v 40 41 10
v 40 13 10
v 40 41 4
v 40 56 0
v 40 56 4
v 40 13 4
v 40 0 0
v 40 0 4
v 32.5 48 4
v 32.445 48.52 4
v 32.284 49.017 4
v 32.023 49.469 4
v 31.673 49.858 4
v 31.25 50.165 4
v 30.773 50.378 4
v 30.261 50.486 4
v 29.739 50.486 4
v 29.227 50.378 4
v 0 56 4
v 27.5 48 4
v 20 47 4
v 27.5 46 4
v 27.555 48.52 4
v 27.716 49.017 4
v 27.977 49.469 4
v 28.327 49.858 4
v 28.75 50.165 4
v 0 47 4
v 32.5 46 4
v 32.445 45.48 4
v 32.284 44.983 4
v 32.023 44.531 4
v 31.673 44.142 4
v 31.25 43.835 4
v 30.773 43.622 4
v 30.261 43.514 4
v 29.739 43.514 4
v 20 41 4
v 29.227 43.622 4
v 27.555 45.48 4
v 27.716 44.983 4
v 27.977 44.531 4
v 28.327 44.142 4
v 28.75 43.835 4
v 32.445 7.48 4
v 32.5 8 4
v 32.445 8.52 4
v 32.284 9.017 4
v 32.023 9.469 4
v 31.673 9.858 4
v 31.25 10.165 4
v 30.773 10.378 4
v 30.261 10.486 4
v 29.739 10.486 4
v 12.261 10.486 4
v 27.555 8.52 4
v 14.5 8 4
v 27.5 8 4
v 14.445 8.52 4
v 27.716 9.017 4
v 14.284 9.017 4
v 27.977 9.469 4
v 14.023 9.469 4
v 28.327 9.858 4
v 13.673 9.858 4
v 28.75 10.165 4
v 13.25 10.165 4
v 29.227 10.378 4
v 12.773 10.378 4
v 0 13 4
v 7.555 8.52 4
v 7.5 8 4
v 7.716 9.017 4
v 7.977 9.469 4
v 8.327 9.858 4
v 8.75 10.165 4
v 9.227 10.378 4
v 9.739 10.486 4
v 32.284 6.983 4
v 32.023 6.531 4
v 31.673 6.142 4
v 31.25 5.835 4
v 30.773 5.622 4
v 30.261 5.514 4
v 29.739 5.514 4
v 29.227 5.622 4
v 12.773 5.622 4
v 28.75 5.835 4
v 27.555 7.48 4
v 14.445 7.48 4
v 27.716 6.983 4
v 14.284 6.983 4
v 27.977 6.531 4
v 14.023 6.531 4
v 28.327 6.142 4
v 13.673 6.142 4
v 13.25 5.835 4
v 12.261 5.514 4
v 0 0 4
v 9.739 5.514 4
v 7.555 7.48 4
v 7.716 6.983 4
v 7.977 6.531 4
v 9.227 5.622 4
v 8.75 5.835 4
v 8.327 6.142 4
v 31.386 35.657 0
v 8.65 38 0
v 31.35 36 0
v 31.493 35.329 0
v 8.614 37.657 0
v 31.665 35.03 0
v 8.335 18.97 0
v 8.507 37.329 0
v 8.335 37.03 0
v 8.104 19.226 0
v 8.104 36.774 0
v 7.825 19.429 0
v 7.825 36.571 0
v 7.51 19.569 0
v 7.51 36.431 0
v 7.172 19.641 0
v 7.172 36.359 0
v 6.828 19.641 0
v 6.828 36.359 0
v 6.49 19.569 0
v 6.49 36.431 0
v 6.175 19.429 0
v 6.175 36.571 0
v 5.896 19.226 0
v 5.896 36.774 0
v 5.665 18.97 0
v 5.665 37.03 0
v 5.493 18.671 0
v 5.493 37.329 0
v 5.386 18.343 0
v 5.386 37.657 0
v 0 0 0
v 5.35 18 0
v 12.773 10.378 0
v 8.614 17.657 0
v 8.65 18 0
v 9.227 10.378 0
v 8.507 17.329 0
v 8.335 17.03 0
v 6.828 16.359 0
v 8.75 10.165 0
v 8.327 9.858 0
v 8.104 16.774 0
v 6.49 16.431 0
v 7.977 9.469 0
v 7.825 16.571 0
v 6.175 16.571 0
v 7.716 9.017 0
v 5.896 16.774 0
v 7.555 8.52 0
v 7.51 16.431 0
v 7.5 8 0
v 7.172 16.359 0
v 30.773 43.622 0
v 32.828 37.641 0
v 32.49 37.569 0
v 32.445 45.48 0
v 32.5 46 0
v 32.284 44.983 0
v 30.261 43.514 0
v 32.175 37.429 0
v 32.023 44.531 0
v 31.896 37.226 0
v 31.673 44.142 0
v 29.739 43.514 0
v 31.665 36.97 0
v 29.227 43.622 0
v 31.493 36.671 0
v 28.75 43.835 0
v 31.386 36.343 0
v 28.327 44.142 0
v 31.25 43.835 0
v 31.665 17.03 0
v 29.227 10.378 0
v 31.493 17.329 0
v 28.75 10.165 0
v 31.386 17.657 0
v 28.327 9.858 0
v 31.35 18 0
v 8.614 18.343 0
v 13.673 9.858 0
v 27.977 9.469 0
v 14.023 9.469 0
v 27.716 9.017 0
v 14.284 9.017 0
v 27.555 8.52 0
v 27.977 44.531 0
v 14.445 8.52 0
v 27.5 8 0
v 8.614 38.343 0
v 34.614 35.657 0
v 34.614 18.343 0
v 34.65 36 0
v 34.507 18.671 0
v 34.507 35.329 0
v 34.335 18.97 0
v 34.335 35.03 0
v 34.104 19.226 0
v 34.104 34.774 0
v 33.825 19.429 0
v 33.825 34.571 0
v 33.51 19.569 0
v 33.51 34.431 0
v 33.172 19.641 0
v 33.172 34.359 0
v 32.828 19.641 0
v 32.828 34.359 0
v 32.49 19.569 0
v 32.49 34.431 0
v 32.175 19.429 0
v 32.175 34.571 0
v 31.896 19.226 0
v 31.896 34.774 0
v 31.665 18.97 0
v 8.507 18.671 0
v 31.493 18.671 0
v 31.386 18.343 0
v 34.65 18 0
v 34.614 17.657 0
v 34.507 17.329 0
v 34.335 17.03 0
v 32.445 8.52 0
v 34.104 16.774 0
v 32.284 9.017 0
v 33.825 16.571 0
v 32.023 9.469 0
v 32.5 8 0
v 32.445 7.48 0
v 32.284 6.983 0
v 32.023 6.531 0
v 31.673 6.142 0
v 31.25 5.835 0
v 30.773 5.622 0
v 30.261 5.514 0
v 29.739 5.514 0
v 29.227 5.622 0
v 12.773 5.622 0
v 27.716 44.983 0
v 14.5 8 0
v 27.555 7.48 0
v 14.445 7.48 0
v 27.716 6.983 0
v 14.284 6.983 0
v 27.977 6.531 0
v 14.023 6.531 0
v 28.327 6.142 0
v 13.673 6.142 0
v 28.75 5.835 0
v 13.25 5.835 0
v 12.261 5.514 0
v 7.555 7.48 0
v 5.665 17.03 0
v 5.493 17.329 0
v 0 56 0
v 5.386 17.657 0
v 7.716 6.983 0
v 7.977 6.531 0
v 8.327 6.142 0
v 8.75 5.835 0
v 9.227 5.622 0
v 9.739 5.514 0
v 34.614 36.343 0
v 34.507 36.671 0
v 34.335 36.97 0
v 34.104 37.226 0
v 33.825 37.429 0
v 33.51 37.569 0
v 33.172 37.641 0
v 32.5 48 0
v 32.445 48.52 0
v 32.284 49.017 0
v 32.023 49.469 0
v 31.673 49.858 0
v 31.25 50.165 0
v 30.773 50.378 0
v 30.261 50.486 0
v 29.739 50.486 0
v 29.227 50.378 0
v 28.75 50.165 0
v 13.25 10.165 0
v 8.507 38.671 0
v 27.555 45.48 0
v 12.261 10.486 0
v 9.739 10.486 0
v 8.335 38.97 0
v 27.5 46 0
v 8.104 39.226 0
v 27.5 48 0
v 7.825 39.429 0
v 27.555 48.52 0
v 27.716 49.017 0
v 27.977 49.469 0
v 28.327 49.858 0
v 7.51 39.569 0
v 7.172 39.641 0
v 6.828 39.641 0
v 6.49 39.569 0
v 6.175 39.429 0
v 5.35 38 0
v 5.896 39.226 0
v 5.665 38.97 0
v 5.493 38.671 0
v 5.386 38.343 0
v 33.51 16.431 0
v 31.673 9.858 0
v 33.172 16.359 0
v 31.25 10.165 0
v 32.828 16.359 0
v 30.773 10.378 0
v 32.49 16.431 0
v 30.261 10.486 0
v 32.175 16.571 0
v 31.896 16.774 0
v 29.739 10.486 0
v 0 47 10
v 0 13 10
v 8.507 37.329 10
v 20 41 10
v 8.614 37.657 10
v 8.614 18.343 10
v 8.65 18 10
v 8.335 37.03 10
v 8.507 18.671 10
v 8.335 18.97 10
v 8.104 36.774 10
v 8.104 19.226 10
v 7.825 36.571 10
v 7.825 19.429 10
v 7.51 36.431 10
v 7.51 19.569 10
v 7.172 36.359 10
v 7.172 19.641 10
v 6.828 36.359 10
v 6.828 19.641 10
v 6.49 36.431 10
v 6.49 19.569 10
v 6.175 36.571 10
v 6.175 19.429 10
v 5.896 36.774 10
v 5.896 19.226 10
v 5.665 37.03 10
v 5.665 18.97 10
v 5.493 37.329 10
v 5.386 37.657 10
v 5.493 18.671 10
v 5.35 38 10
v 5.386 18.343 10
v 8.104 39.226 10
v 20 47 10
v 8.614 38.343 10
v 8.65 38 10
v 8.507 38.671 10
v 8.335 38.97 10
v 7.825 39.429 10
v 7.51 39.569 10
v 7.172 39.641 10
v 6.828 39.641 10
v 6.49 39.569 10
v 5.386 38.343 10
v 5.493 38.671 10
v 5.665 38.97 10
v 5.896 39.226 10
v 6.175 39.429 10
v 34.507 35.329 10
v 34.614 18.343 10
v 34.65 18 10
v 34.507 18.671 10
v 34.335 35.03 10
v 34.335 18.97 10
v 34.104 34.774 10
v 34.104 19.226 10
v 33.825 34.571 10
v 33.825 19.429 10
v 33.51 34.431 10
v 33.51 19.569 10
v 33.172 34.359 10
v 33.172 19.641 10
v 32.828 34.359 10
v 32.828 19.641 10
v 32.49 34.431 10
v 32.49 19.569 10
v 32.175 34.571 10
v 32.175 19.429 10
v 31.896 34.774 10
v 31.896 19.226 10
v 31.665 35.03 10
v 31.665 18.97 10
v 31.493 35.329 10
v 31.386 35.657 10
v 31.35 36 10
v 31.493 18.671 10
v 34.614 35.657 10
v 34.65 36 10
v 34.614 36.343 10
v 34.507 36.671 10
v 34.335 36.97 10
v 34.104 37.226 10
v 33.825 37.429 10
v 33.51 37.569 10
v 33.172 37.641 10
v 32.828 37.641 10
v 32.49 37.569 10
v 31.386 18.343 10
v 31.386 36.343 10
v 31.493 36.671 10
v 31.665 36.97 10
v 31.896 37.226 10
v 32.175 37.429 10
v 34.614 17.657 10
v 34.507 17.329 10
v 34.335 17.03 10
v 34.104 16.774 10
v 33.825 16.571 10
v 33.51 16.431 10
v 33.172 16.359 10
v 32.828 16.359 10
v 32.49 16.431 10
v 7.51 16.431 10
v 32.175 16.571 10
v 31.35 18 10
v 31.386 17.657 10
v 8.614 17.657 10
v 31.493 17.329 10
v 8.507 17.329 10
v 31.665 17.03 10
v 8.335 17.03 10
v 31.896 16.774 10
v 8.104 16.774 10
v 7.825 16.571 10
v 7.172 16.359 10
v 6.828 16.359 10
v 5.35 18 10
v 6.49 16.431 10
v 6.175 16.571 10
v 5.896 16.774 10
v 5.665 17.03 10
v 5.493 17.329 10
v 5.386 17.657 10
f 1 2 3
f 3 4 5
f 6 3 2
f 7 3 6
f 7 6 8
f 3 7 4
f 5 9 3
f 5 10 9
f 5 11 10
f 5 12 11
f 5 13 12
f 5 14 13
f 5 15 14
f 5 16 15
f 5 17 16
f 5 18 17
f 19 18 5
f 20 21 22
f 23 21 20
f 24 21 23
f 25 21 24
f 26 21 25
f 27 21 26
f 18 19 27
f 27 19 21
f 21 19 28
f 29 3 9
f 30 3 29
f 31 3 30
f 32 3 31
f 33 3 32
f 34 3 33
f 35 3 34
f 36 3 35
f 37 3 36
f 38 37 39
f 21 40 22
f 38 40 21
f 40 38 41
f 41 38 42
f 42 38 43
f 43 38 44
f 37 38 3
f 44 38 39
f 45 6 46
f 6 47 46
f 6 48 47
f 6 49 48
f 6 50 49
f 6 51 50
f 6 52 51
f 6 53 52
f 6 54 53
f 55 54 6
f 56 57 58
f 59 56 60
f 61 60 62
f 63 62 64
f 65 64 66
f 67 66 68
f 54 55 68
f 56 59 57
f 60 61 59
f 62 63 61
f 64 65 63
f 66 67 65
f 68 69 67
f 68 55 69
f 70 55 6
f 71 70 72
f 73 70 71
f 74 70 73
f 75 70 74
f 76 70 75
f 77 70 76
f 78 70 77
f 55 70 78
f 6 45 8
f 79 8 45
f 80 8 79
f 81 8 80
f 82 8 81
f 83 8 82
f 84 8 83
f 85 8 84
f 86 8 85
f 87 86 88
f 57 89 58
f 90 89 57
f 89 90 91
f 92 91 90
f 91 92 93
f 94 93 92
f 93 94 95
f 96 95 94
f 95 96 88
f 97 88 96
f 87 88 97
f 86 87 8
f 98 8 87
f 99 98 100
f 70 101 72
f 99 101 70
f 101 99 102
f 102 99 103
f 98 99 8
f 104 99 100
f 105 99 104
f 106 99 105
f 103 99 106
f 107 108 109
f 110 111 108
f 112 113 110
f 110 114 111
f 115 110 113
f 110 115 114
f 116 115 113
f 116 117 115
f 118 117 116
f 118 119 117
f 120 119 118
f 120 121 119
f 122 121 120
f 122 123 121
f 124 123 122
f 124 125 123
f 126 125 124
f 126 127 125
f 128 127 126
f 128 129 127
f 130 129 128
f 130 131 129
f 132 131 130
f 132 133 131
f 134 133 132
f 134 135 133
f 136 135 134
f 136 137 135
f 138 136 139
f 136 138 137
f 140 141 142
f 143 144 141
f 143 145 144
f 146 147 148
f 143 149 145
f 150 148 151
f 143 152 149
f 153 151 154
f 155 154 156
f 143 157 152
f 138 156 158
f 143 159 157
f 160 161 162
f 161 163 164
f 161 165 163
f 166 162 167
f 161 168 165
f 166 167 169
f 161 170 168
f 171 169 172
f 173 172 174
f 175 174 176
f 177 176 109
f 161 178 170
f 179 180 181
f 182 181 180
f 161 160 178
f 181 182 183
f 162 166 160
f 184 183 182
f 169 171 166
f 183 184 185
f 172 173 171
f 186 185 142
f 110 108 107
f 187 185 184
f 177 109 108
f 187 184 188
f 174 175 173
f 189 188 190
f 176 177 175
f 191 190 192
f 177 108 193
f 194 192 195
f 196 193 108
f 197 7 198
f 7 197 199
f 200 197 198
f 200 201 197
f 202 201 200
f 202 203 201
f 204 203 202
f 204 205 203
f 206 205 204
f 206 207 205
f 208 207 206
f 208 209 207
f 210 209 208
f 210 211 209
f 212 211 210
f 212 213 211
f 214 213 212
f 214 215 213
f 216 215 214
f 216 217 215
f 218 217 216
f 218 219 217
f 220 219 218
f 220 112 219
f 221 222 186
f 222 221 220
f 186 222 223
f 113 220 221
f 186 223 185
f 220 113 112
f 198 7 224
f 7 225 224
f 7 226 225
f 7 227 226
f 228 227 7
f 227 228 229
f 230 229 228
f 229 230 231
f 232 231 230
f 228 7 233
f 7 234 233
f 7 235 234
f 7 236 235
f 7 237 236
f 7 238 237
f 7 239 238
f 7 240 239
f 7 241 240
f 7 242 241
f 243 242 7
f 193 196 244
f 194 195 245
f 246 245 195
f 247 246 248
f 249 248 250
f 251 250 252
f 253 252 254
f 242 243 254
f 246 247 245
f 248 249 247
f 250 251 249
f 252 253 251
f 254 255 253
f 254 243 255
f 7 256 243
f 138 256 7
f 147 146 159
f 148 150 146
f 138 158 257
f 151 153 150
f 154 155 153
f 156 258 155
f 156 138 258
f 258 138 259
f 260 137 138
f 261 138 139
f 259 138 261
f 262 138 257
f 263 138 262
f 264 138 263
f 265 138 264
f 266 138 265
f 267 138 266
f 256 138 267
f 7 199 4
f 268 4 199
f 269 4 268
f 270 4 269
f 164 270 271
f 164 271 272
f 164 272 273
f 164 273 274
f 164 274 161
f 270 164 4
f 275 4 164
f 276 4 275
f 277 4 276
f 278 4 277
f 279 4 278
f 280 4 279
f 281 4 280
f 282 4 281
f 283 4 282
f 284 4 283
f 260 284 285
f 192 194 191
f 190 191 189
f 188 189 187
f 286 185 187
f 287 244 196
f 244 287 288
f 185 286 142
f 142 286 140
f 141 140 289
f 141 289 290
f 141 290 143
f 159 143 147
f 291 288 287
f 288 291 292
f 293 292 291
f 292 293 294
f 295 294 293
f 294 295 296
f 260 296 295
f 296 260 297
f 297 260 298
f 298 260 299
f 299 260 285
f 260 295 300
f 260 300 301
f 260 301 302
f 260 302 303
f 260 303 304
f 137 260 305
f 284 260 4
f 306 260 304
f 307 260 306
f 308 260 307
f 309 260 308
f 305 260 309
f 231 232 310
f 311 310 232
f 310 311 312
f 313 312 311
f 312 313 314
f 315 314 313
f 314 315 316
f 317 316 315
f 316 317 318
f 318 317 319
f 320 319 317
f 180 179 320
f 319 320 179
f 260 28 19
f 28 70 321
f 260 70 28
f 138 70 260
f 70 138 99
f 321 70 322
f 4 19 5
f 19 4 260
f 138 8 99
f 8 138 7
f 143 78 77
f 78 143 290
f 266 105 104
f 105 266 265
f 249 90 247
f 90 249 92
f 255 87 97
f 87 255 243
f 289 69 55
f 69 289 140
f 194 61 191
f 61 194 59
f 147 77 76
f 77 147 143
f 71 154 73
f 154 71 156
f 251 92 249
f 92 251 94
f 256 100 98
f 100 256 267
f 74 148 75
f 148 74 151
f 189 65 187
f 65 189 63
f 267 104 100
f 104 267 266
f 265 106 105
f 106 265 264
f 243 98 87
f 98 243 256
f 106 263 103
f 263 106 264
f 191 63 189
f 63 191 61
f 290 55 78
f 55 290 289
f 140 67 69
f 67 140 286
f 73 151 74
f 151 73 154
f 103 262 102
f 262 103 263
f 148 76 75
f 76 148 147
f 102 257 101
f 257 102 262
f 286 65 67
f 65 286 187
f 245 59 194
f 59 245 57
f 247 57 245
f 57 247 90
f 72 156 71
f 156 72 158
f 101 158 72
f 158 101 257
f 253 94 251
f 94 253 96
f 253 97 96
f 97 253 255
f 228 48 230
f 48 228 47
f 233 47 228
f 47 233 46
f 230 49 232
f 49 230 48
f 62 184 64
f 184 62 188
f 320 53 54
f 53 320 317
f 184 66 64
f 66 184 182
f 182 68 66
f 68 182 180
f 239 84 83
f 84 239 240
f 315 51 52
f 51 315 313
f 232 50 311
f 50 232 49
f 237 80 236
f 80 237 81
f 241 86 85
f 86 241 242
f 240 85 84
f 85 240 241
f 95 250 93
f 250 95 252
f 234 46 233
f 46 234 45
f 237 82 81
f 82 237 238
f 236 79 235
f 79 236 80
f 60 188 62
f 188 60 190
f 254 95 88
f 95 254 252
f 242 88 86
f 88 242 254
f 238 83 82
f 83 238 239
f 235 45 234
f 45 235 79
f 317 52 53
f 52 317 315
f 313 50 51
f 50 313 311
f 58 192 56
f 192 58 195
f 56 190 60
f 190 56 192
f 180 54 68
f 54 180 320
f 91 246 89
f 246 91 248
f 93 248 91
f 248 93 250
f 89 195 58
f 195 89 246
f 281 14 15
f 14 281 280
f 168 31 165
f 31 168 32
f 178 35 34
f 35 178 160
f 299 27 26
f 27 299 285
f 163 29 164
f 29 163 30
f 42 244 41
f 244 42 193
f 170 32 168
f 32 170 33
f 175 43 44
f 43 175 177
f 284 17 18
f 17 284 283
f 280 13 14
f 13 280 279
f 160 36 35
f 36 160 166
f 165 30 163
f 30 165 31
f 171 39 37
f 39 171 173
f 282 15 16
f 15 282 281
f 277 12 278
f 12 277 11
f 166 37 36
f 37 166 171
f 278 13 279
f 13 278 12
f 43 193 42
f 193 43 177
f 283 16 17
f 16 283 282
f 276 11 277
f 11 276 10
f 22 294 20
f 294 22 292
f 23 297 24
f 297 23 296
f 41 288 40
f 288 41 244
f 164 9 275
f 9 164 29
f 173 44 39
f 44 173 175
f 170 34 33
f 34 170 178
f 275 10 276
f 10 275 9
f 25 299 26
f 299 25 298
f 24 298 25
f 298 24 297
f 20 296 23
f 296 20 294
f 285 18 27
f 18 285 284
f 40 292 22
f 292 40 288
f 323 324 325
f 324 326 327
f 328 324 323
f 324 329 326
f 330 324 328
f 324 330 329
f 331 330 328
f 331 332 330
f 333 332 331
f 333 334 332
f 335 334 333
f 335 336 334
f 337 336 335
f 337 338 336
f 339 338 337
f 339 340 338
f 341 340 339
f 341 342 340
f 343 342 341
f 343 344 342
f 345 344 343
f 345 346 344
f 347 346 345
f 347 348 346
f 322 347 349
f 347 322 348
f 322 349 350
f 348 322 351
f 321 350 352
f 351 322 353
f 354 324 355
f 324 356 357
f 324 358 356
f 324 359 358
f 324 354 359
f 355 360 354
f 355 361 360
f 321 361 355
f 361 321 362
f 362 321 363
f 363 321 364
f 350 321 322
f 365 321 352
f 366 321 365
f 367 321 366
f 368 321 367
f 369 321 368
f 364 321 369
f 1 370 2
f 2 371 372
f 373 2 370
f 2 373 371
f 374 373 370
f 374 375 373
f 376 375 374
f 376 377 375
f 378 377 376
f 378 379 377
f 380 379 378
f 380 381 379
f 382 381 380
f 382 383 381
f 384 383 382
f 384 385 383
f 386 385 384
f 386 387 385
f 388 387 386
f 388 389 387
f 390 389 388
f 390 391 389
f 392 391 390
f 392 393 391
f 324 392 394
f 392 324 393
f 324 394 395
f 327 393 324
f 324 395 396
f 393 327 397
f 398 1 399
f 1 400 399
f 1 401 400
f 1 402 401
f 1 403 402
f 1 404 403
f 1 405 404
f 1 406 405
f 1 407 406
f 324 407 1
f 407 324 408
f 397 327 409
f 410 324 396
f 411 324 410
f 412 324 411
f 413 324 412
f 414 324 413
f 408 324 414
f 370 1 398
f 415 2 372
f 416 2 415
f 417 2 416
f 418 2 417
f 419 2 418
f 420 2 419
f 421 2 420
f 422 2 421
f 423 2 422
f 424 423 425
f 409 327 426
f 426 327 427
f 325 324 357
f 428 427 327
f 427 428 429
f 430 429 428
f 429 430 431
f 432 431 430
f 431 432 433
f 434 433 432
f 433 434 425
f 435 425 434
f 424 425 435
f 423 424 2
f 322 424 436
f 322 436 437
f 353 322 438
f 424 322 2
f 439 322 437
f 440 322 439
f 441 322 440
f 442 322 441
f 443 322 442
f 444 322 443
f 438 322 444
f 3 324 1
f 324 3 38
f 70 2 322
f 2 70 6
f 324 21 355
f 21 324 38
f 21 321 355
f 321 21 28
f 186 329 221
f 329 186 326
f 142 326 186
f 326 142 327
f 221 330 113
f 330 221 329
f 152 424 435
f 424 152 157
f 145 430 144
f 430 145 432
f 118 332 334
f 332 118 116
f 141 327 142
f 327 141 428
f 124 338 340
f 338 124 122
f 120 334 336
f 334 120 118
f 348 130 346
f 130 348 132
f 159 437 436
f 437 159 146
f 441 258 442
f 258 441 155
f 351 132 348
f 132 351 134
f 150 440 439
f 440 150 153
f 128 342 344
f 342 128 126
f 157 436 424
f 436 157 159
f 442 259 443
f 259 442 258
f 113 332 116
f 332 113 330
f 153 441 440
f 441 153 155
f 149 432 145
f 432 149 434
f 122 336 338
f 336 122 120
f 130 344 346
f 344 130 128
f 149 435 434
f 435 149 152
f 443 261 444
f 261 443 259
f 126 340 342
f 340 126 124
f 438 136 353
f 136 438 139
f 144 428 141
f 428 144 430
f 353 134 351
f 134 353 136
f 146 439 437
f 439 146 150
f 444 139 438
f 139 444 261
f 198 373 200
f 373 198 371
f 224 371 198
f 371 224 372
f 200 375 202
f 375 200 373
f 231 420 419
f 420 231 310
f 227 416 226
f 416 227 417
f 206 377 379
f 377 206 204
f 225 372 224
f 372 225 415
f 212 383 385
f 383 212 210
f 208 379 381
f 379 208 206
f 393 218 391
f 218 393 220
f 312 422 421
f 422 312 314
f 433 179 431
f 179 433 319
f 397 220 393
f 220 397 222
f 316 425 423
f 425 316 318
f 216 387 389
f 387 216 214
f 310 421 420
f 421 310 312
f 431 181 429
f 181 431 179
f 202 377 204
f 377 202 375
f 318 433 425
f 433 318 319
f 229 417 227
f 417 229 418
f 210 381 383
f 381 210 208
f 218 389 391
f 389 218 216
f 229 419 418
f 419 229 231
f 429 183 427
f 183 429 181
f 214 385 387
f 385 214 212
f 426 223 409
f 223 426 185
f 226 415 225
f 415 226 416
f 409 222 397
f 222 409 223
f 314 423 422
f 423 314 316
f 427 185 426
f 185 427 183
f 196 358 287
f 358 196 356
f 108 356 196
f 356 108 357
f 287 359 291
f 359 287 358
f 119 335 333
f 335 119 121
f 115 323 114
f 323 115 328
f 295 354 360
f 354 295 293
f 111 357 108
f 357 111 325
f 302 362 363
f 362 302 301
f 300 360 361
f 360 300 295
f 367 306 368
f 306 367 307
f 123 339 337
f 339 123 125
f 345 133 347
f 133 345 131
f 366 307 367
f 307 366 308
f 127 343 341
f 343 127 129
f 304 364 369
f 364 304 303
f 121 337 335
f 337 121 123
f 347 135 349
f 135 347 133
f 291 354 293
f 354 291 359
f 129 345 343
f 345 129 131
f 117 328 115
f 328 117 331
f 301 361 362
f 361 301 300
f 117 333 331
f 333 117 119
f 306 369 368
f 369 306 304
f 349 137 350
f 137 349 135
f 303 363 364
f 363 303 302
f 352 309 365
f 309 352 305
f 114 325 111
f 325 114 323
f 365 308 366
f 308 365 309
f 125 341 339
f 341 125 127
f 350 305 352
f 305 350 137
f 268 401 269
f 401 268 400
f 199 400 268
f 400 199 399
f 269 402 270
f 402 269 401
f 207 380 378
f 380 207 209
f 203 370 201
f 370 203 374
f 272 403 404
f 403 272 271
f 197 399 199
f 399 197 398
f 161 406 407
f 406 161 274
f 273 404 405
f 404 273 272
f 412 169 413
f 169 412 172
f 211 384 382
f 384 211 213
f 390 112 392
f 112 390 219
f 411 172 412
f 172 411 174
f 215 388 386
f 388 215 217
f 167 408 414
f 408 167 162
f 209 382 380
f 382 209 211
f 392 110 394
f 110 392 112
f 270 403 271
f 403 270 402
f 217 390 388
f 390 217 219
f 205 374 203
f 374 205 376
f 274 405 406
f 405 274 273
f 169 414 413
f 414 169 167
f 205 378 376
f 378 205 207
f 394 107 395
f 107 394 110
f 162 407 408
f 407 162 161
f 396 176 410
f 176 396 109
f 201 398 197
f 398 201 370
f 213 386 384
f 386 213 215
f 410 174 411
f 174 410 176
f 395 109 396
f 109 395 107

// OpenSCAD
$fn=30;

module base() {
    difference() {
        //base
        cube([40, 56, 4]);
    
        hull() {
            translate([10, 8, 0]) cylinder(d=5, h=8);
            translate([12, 8, 0]) cylinder(d=5, h=8);
        }
        translate([30, 8, 0]) cylinder(d=5, h=8);
        hull() {
            translate([30, 46, 0]) cylinder(d=5, h=8);
            translate([30, 48, 0]) cylinder(d=5, h=8);
        }
    }
}

module body() {
    union() {
        base();
        translate([0,13,0]) cube([40, 28,10]);
        translate([0,41,0]) cube([20, 6,10]);
    }
}

module bed_carriage_bottom() {
    difference() {
        body();
        translate([7, 18, 0]) cylinder(d=3.3, h=11);
        translate([33, 18, 0]) cylinder(d=3.3, h=11);
        translate([7, 38, 0]) cylinder(d=3.3, h=11);
        translate([33, 36, 0]) cylinder(d=3.3, h=11);
    }
}

bed_carriage_bottom();
